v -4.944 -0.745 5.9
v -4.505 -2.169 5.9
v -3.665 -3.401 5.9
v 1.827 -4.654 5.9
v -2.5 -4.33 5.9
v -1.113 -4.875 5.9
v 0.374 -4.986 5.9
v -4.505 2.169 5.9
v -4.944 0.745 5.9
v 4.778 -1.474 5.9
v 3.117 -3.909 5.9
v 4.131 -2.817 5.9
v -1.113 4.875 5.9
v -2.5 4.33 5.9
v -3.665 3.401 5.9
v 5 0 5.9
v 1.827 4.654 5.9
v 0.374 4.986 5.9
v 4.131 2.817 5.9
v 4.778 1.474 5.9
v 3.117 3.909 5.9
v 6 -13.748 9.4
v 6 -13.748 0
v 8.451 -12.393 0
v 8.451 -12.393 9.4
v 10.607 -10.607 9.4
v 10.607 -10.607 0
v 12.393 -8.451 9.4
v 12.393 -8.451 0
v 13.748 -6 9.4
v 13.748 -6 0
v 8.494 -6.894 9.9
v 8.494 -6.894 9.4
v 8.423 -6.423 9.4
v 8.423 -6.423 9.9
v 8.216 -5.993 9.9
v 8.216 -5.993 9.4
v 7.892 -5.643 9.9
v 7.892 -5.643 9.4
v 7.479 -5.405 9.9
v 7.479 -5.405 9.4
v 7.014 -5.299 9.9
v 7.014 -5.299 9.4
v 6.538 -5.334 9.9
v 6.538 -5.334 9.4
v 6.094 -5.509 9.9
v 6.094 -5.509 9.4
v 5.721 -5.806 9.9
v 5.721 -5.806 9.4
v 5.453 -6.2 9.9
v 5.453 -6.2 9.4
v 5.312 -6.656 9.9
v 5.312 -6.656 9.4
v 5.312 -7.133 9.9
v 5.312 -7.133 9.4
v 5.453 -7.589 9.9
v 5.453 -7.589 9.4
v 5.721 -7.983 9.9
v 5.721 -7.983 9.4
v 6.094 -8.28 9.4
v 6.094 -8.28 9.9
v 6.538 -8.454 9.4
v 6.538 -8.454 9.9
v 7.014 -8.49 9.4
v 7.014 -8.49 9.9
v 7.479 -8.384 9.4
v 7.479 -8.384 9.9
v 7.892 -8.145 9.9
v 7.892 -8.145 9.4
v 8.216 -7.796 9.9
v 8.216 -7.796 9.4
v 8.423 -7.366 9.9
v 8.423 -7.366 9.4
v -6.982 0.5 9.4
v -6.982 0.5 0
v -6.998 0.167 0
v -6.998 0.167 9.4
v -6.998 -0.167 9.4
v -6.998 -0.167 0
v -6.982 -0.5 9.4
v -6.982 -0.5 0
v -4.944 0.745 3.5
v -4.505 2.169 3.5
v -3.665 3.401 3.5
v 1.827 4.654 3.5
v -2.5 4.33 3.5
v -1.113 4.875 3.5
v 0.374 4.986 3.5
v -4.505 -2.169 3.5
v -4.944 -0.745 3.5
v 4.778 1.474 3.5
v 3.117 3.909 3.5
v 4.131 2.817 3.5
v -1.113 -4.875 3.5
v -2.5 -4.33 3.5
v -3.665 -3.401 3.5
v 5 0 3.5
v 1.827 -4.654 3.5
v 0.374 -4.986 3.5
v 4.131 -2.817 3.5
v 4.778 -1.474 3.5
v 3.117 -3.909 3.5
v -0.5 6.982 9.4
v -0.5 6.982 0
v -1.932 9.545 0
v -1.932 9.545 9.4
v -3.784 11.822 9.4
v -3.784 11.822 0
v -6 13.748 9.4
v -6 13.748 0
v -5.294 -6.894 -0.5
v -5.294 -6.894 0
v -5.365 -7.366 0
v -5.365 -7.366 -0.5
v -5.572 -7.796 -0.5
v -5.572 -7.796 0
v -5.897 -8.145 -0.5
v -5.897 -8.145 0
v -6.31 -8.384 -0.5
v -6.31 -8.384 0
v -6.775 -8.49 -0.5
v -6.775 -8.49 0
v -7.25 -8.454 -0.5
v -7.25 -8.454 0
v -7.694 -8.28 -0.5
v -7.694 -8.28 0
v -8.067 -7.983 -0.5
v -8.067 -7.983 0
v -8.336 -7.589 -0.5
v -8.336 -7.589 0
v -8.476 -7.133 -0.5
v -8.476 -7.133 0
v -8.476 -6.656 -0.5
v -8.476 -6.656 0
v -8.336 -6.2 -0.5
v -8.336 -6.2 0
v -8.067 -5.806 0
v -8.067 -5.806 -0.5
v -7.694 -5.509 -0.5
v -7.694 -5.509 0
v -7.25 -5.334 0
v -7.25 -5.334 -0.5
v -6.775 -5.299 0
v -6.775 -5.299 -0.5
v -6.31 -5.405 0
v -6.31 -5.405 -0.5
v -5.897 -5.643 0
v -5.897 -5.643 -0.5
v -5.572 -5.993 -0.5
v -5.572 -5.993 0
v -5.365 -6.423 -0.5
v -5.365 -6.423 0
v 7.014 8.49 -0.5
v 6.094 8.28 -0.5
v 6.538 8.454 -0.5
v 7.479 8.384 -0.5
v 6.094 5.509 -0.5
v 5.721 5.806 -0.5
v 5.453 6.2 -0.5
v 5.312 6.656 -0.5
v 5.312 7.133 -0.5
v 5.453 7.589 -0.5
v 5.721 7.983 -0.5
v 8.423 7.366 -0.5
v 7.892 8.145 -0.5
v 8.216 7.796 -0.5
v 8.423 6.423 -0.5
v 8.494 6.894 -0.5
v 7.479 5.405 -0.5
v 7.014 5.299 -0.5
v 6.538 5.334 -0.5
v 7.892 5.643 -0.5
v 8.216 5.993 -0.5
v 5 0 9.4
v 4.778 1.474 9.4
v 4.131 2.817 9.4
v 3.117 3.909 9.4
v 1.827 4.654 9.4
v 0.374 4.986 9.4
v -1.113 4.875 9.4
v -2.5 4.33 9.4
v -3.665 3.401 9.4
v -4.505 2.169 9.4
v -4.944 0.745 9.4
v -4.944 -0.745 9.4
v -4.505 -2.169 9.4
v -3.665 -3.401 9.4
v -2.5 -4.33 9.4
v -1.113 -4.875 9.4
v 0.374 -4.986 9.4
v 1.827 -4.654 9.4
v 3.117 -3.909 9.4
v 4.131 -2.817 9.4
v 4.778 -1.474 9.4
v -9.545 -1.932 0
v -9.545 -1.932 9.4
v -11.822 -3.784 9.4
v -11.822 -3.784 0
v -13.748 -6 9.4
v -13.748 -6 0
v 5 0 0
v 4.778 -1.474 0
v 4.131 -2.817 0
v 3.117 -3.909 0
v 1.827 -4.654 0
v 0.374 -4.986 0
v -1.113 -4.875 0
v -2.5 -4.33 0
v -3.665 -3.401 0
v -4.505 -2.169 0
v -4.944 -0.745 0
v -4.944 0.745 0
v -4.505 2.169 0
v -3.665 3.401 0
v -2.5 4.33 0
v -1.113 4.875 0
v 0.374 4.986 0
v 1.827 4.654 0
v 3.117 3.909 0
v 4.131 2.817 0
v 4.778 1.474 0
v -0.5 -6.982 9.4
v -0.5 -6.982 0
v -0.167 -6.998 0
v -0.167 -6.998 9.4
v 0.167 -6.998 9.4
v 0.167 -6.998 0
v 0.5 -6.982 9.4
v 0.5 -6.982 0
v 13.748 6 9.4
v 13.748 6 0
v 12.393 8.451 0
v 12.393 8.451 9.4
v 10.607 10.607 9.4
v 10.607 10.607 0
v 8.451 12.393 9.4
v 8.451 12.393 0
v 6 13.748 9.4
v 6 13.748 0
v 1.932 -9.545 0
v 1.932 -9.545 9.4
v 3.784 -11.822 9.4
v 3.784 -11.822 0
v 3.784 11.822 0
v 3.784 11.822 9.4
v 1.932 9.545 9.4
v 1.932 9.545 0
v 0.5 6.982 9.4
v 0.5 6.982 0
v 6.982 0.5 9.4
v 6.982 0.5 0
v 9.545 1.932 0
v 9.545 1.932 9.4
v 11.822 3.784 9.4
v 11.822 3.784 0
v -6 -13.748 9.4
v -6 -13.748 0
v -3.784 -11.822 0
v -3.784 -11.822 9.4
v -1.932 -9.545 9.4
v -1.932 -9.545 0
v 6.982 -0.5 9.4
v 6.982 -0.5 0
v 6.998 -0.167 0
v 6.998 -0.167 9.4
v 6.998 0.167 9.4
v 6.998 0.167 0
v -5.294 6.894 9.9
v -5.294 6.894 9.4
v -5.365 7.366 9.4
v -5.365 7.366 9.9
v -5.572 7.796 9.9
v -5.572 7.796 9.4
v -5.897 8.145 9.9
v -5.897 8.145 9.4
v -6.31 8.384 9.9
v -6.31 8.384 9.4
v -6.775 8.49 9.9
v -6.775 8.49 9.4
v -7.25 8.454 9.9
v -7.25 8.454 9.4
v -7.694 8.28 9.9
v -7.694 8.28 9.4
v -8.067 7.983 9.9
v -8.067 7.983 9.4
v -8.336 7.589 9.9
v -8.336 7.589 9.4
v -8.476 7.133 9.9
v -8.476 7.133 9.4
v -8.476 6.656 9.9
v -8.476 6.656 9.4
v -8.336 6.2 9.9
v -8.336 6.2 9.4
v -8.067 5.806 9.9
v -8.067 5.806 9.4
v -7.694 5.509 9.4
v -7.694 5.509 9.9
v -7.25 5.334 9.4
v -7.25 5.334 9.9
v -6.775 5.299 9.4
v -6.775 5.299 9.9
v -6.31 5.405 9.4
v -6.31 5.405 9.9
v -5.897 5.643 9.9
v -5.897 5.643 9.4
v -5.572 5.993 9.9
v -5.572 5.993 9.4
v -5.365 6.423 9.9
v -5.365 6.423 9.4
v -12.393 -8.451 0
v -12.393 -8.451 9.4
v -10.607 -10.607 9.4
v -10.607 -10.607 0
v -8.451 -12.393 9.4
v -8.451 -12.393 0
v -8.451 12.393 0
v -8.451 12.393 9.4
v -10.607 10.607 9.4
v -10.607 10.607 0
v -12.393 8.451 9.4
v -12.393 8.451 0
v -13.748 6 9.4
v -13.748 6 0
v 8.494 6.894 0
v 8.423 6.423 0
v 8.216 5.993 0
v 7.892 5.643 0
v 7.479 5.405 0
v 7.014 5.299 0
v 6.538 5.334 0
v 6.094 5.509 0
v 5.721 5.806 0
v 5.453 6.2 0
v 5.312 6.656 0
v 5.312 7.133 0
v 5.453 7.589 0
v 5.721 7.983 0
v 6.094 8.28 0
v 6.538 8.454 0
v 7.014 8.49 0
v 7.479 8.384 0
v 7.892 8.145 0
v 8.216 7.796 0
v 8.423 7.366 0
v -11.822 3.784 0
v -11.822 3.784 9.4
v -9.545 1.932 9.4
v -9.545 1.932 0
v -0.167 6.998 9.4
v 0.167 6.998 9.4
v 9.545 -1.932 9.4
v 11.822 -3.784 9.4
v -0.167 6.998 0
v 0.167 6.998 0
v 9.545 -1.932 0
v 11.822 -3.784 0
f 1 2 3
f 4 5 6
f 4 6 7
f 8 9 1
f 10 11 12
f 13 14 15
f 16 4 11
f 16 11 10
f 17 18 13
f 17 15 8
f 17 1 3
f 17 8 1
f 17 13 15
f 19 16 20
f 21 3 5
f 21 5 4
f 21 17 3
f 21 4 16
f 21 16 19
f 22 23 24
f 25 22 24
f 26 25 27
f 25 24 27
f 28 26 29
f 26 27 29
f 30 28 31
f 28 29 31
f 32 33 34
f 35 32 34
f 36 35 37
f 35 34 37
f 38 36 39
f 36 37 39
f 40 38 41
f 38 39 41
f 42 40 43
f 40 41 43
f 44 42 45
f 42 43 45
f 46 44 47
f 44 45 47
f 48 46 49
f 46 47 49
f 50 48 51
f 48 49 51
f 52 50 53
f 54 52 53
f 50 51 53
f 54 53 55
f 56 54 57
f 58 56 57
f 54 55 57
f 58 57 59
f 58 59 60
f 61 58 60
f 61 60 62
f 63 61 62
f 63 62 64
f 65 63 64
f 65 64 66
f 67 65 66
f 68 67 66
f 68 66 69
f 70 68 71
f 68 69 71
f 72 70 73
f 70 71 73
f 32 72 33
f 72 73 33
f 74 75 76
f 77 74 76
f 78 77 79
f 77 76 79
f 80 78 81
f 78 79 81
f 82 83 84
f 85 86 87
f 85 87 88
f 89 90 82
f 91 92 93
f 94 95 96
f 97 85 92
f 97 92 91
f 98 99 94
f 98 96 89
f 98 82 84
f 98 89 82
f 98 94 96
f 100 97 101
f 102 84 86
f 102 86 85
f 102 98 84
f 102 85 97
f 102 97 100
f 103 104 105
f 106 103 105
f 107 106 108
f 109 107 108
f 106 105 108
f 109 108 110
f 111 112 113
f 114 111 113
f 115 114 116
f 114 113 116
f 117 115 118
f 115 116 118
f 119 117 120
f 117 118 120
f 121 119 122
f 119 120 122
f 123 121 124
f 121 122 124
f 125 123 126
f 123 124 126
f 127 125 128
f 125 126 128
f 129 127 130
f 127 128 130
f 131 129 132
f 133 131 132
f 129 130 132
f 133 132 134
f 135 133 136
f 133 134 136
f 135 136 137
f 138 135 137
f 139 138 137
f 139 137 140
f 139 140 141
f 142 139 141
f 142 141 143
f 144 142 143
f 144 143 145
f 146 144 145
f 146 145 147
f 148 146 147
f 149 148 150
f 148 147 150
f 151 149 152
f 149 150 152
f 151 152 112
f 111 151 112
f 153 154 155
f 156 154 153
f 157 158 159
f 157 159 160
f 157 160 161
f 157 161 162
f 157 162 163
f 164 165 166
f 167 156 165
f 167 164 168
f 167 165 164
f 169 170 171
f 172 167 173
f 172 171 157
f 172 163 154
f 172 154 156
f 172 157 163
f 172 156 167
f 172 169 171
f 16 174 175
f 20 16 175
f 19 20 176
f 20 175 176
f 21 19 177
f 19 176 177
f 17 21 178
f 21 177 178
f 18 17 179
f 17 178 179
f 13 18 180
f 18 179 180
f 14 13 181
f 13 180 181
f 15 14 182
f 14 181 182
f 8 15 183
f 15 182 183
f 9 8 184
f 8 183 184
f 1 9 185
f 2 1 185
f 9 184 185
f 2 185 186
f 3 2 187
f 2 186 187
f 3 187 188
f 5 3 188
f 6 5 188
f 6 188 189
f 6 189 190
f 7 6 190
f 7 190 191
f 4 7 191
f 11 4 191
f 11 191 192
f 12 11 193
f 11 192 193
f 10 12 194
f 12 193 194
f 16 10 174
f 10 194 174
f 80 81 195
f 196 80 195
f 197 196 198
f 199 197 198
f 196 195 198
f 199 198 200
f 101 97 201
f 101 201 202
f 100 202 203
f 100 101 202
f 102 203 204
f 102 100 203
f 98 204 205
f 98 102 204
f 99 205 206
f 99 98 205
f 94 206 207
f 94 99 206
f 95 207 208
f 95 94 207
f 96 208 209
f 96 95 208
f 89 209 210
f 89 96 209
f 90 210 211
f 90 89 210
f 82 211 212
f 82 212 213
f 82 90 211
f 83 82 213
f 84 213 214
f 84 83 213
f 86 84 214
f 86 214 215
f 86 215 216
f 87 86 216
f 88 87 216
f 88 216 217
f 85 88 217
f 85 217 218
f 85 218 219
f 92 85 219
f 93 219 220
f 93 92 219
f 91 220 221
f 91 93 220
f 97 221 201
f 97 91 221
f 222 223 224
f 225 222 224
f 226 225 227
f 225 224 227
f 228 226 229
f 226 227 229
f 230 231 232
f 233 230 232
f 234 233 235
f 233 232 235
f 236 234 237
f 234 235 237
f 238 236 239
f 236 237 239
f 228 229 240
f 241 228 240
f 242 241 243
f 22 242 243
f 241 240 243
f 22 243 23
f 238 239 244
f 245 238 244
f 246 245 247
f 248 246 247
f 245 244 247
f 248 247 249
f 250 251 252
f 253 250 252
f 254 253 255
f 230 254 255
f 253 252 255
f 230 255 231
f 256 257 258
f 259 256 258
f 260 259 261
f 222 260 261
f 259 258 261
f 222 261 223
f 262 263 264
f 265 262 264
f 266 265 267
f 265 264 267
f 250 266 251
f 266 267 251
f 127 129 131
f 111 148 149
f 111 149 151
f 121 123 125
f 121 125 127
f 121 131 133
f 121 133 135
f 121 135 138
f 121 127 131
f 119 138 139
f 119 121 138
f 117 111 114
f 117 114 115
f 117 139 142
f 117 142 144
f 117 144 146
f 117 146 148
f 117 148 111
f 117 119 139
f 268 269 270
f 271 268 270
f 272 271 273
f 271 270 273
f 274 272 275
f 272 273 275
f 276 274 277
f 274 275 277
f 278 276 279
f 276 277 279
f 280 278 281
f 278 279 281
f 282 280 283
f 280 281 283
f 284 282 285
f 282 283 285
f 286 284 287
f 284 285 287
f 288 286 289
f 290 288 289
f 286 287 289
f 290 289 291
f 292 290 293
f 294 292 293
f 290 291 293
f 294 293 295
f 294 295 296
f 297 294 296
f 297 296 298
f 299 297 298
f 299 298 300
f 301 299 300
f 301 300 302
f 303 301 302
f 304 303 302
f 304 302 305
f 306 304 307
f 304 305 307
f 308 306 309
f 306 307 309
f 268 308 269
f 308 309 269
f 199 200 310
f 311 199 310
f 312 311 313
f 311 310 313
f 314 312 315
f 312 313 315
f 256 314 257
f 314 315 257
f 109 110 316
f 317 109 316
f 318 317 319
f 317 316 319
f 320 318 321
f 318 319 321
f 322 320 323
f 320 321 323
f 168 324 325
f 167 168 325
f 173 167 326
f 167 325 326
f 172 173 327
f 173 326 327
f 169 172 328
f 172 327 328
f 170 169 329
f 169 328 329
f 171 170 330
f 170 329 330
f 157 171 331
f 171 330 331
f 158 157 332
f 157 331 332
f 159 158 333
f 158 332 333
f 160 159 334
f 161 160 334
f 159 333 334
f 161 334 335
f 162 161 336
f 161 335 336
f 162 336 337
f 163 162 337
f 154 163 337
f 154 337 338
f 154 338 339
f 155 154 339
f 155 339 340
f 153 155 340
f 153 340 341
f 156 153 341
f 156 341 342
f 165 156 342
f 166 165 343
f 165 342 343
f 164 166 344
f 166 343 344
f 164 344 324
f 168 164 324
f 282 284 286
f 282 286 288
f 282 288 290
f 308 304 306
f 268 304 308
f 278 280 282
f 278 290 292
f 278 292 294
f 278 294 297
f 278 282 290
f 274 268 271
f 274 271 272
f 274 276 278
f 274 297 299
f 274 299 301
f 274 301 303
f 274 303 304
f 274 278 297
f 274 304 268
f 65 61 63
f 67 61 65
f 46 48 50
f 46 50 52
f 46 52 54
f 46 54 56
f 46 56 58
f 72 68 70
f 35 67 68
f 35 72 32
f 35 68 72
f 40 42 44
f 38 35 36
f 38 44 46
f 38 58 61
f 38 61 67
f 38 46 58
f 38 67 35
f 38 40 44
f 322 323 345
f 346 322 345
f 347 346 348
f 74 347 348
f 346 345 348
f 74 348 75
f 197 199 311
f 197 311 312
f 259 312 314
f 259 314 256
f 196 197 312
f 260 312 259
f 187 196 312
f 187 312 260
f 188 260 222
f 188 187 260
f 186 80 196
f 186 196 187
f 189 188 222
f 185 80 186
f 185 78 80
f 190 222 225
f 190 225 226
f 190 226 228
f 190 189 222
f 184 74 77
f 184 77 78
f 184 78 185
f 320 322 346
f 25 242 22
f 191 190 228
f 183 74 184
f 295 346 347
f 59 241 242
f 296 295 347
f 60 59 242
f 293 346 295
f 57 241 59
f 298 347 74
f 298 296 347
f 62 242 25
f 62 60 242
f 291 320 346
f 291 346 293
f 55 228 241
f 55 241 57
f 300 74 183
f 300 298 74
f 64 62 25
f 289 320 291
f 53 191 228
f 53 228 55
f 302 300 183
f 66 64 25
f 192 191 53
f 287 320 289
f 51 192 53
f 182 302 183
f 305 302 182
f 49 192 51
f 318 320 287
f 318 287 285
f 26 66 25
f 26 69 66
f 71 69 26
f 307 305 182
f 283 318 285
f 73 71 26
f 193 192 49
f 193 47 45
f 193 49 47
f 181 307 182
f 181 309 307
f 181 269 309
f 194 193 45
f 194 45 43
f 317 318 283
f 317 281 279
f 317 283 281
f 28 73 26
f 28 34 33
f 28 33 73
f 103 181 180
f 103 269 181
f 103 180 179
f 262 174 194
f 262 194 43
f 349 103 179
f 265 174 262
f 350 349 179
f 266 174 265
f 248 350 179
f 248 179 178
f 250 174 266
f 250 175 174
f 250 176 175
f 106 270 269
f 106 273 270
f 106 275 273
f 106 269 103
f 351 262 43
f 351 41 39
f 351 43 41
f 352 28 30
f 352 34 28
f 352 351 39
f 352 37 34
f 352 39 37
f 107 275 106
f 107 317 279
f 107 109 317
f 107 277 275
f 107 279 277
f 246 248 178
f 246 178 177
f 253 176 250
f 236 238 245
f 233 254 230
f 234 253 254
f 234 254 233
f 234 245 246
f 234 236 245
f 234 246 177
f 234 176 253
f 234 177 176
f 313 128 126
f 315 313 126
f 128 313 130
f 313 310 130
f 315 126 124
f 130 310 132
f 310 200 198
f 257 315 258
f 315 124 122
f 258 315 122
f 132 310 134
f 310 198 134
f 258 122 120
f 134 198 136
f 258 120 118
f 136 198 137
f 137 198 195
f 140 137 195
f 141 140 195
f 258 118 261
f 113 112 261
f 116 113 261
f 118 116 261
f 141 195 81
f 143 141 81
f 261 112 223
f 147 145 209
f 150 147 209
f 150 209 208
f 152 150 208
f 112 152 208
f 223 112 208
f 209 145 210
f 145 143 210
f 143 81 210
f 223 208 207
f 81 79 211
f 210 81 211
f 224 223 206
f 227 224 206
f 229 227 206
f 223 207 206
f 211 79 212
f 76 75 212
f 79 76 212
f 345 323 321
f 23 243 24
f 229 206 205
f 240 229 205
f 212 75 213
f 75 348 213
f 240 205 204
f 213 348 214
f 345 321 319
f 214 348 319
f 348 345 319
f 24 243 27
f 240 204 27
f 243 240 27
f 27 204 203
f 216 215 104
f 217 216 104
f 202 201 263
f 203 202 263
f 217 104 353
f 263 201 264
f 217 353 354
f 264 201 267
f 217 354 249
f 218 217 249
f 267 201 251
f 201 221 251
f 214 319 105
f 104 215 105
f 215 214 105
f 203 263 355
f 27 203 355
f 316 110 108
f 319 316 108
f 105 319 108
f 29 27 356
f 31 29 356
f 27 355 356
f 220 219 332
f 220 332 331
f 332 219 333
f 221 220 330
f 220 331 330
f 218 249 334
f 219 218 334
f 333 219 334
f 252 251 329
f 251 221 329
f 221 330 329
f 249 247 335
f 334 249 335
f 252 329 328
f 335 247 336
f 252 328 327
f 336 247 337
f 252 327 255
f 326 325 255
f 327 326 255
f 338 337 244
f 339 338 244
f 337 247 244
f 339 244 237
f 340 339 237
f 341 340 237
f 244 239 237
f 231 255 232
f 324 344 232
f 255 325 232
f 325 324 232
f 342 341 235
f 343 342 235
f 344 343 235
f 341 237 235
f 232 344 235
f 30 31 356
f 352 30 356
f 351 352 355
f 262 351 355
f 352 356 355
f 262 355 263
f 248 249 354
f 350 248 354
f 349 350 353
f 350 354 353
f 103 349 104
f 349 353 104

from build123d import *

# Parameters (mm, degrees)
BOSS_EXTRUDE1_DEPTH = 9.4
SKETCH2_R           = 5
CUT_EXTRUDE1_DEPTH  = 3.5
CUT_EXTRUDE2_START  = -3.5
SKETCH3_R           = 5
CUT_EXTRUDE2_DEPTH  = 3.5
SKETCH4_R           = 1.6
BOSS_EXTRUDE2_DEPTH = 0.5
SKETCH5_R           = 1.6
BOSS_EXTRUDE3_DEPTH = 0.5


with BuildPart() as part:
    # Sketch1 → Boss-Extrude1 (new body)
    with BuildSketch(Plane.XY):
        with BuildLine():
            ThreePointArc((6, -13.747727085), (10.606601718, -10.606601718), (13.747727085, -6))
            ThreePointArc((13.747727085, -6), (10.72353208, -2.808871931), (6.982120022, -0.5))
            ThreePointArc((6.982120022, -0.5), (7, 0), (6.982120022, 0.5))
            ThreePointArc((6.982120022, 0.5), (10.72353208, 2.808871931), (13.747727085, 6))
            ThreePointArc((13.747727085, 6), (10.606601718, 10.606601718), (6, 13.747727085))
            ThreePointArc((6, 13.747727085), (2.808871931, 10.72353208), (0.5, 6.982120022))
            ThreePointArc((0.5, 6.982120022), (0, 7), (-0.5, 6.982120022))
            ThreePointArc((-0.5, 6.982120022), (-2.808871931, 10.72353208), (-6, 13.747727085))
            ThreePointArc((-6, 13.747727085), (-10.606601718, 10.606601718), (-13.747727085, 6))
            ThreePointArc((-13.747727085, 6), (-10.72353208, 2.808871931), (-6.982120022, 0.5))
            ThreePointArc((-6.982120022, 0.5), (-7, 0), (-6.982120022, -0.5))
            ThreePointArc((-6.982120022, -0.5), (-10.72353208, -2.808871931), (-13.747727085, -6))
            ThreePointArc((-13.747727085, -6), (-10.606601718, -10.606601718), (-6, -13.747727085))
            ThreePointArc((-6, -13.747727085), (-2.808871931, -10.72353208), (-0.5, -6.982120022))
            ThreePointArc((-0.5, -6.982120022), (0, -7), (0.5, -6.982120022))
            ThreePointArc((0.5, -6.982120022), (2.808871931, -10.72353208), (6, -13.747727085))
        make_face()
    extrude(amount=BOSS_EXTRUDE1_DEPTH)

    # Sketch2 → Cut-Extrude1 (cut)
    with BuildSketch(Plane.XY.offset(9.4)):
        Circle(SKETCH2_R)
    extrude(amount=-CUT_EXTRUDE1_DEPTH, mode=Mode.SUBTRACT)

    # Sketch3 → Cut-Extrude2 (cut)
    with BuildSketch(Plane(origin=(0, 0, 0), x_dir=(-1, 0, 0), z_dir=(0, 0, -1)).offset(CUT_EXTRUDE2_START)):
        with Locations(Location((0, 0, 0), (0, 0, 180))):
            Circle(SKETCH3_R)
    extrude(amount=CUT_EXTRUDE2_DEPTH, mode=Mode.SUBTRACT)

    # Sketch4 → Boss-Extrude2 (add)
    with BuildSketch(Plane.XY.offset(9.4)):
        with Locations((-6.894291117, 6.894291117)):
            Circle(SKETCH4_R)
        with Locations((6.894291117, -6.894291117)):
            Circle(SKETCH4_R)
    extrude(amount=BOSS_EXTRUDE2_DEPTH)

    # Sketch5 → Boss-Extrude3 (add)
    with BuildSketch(Plane(origin=(0, 0, 0), x_dir=(-1, 0, 0), z_dir=(0, 0, -1))):
        with Locations(Location((-6.894291117, 6.894291117, 0), (0, 0, 180))):
            Circle(SKETCH5_R)
        with Locations(Location((6.894291117, -6.894291117, 0), (0, 0, 180))):
            Circle(SKETCH5_R)
    extrude(amount=BOSS_EXTRUDE3_DEPTH)


solid = part.part
